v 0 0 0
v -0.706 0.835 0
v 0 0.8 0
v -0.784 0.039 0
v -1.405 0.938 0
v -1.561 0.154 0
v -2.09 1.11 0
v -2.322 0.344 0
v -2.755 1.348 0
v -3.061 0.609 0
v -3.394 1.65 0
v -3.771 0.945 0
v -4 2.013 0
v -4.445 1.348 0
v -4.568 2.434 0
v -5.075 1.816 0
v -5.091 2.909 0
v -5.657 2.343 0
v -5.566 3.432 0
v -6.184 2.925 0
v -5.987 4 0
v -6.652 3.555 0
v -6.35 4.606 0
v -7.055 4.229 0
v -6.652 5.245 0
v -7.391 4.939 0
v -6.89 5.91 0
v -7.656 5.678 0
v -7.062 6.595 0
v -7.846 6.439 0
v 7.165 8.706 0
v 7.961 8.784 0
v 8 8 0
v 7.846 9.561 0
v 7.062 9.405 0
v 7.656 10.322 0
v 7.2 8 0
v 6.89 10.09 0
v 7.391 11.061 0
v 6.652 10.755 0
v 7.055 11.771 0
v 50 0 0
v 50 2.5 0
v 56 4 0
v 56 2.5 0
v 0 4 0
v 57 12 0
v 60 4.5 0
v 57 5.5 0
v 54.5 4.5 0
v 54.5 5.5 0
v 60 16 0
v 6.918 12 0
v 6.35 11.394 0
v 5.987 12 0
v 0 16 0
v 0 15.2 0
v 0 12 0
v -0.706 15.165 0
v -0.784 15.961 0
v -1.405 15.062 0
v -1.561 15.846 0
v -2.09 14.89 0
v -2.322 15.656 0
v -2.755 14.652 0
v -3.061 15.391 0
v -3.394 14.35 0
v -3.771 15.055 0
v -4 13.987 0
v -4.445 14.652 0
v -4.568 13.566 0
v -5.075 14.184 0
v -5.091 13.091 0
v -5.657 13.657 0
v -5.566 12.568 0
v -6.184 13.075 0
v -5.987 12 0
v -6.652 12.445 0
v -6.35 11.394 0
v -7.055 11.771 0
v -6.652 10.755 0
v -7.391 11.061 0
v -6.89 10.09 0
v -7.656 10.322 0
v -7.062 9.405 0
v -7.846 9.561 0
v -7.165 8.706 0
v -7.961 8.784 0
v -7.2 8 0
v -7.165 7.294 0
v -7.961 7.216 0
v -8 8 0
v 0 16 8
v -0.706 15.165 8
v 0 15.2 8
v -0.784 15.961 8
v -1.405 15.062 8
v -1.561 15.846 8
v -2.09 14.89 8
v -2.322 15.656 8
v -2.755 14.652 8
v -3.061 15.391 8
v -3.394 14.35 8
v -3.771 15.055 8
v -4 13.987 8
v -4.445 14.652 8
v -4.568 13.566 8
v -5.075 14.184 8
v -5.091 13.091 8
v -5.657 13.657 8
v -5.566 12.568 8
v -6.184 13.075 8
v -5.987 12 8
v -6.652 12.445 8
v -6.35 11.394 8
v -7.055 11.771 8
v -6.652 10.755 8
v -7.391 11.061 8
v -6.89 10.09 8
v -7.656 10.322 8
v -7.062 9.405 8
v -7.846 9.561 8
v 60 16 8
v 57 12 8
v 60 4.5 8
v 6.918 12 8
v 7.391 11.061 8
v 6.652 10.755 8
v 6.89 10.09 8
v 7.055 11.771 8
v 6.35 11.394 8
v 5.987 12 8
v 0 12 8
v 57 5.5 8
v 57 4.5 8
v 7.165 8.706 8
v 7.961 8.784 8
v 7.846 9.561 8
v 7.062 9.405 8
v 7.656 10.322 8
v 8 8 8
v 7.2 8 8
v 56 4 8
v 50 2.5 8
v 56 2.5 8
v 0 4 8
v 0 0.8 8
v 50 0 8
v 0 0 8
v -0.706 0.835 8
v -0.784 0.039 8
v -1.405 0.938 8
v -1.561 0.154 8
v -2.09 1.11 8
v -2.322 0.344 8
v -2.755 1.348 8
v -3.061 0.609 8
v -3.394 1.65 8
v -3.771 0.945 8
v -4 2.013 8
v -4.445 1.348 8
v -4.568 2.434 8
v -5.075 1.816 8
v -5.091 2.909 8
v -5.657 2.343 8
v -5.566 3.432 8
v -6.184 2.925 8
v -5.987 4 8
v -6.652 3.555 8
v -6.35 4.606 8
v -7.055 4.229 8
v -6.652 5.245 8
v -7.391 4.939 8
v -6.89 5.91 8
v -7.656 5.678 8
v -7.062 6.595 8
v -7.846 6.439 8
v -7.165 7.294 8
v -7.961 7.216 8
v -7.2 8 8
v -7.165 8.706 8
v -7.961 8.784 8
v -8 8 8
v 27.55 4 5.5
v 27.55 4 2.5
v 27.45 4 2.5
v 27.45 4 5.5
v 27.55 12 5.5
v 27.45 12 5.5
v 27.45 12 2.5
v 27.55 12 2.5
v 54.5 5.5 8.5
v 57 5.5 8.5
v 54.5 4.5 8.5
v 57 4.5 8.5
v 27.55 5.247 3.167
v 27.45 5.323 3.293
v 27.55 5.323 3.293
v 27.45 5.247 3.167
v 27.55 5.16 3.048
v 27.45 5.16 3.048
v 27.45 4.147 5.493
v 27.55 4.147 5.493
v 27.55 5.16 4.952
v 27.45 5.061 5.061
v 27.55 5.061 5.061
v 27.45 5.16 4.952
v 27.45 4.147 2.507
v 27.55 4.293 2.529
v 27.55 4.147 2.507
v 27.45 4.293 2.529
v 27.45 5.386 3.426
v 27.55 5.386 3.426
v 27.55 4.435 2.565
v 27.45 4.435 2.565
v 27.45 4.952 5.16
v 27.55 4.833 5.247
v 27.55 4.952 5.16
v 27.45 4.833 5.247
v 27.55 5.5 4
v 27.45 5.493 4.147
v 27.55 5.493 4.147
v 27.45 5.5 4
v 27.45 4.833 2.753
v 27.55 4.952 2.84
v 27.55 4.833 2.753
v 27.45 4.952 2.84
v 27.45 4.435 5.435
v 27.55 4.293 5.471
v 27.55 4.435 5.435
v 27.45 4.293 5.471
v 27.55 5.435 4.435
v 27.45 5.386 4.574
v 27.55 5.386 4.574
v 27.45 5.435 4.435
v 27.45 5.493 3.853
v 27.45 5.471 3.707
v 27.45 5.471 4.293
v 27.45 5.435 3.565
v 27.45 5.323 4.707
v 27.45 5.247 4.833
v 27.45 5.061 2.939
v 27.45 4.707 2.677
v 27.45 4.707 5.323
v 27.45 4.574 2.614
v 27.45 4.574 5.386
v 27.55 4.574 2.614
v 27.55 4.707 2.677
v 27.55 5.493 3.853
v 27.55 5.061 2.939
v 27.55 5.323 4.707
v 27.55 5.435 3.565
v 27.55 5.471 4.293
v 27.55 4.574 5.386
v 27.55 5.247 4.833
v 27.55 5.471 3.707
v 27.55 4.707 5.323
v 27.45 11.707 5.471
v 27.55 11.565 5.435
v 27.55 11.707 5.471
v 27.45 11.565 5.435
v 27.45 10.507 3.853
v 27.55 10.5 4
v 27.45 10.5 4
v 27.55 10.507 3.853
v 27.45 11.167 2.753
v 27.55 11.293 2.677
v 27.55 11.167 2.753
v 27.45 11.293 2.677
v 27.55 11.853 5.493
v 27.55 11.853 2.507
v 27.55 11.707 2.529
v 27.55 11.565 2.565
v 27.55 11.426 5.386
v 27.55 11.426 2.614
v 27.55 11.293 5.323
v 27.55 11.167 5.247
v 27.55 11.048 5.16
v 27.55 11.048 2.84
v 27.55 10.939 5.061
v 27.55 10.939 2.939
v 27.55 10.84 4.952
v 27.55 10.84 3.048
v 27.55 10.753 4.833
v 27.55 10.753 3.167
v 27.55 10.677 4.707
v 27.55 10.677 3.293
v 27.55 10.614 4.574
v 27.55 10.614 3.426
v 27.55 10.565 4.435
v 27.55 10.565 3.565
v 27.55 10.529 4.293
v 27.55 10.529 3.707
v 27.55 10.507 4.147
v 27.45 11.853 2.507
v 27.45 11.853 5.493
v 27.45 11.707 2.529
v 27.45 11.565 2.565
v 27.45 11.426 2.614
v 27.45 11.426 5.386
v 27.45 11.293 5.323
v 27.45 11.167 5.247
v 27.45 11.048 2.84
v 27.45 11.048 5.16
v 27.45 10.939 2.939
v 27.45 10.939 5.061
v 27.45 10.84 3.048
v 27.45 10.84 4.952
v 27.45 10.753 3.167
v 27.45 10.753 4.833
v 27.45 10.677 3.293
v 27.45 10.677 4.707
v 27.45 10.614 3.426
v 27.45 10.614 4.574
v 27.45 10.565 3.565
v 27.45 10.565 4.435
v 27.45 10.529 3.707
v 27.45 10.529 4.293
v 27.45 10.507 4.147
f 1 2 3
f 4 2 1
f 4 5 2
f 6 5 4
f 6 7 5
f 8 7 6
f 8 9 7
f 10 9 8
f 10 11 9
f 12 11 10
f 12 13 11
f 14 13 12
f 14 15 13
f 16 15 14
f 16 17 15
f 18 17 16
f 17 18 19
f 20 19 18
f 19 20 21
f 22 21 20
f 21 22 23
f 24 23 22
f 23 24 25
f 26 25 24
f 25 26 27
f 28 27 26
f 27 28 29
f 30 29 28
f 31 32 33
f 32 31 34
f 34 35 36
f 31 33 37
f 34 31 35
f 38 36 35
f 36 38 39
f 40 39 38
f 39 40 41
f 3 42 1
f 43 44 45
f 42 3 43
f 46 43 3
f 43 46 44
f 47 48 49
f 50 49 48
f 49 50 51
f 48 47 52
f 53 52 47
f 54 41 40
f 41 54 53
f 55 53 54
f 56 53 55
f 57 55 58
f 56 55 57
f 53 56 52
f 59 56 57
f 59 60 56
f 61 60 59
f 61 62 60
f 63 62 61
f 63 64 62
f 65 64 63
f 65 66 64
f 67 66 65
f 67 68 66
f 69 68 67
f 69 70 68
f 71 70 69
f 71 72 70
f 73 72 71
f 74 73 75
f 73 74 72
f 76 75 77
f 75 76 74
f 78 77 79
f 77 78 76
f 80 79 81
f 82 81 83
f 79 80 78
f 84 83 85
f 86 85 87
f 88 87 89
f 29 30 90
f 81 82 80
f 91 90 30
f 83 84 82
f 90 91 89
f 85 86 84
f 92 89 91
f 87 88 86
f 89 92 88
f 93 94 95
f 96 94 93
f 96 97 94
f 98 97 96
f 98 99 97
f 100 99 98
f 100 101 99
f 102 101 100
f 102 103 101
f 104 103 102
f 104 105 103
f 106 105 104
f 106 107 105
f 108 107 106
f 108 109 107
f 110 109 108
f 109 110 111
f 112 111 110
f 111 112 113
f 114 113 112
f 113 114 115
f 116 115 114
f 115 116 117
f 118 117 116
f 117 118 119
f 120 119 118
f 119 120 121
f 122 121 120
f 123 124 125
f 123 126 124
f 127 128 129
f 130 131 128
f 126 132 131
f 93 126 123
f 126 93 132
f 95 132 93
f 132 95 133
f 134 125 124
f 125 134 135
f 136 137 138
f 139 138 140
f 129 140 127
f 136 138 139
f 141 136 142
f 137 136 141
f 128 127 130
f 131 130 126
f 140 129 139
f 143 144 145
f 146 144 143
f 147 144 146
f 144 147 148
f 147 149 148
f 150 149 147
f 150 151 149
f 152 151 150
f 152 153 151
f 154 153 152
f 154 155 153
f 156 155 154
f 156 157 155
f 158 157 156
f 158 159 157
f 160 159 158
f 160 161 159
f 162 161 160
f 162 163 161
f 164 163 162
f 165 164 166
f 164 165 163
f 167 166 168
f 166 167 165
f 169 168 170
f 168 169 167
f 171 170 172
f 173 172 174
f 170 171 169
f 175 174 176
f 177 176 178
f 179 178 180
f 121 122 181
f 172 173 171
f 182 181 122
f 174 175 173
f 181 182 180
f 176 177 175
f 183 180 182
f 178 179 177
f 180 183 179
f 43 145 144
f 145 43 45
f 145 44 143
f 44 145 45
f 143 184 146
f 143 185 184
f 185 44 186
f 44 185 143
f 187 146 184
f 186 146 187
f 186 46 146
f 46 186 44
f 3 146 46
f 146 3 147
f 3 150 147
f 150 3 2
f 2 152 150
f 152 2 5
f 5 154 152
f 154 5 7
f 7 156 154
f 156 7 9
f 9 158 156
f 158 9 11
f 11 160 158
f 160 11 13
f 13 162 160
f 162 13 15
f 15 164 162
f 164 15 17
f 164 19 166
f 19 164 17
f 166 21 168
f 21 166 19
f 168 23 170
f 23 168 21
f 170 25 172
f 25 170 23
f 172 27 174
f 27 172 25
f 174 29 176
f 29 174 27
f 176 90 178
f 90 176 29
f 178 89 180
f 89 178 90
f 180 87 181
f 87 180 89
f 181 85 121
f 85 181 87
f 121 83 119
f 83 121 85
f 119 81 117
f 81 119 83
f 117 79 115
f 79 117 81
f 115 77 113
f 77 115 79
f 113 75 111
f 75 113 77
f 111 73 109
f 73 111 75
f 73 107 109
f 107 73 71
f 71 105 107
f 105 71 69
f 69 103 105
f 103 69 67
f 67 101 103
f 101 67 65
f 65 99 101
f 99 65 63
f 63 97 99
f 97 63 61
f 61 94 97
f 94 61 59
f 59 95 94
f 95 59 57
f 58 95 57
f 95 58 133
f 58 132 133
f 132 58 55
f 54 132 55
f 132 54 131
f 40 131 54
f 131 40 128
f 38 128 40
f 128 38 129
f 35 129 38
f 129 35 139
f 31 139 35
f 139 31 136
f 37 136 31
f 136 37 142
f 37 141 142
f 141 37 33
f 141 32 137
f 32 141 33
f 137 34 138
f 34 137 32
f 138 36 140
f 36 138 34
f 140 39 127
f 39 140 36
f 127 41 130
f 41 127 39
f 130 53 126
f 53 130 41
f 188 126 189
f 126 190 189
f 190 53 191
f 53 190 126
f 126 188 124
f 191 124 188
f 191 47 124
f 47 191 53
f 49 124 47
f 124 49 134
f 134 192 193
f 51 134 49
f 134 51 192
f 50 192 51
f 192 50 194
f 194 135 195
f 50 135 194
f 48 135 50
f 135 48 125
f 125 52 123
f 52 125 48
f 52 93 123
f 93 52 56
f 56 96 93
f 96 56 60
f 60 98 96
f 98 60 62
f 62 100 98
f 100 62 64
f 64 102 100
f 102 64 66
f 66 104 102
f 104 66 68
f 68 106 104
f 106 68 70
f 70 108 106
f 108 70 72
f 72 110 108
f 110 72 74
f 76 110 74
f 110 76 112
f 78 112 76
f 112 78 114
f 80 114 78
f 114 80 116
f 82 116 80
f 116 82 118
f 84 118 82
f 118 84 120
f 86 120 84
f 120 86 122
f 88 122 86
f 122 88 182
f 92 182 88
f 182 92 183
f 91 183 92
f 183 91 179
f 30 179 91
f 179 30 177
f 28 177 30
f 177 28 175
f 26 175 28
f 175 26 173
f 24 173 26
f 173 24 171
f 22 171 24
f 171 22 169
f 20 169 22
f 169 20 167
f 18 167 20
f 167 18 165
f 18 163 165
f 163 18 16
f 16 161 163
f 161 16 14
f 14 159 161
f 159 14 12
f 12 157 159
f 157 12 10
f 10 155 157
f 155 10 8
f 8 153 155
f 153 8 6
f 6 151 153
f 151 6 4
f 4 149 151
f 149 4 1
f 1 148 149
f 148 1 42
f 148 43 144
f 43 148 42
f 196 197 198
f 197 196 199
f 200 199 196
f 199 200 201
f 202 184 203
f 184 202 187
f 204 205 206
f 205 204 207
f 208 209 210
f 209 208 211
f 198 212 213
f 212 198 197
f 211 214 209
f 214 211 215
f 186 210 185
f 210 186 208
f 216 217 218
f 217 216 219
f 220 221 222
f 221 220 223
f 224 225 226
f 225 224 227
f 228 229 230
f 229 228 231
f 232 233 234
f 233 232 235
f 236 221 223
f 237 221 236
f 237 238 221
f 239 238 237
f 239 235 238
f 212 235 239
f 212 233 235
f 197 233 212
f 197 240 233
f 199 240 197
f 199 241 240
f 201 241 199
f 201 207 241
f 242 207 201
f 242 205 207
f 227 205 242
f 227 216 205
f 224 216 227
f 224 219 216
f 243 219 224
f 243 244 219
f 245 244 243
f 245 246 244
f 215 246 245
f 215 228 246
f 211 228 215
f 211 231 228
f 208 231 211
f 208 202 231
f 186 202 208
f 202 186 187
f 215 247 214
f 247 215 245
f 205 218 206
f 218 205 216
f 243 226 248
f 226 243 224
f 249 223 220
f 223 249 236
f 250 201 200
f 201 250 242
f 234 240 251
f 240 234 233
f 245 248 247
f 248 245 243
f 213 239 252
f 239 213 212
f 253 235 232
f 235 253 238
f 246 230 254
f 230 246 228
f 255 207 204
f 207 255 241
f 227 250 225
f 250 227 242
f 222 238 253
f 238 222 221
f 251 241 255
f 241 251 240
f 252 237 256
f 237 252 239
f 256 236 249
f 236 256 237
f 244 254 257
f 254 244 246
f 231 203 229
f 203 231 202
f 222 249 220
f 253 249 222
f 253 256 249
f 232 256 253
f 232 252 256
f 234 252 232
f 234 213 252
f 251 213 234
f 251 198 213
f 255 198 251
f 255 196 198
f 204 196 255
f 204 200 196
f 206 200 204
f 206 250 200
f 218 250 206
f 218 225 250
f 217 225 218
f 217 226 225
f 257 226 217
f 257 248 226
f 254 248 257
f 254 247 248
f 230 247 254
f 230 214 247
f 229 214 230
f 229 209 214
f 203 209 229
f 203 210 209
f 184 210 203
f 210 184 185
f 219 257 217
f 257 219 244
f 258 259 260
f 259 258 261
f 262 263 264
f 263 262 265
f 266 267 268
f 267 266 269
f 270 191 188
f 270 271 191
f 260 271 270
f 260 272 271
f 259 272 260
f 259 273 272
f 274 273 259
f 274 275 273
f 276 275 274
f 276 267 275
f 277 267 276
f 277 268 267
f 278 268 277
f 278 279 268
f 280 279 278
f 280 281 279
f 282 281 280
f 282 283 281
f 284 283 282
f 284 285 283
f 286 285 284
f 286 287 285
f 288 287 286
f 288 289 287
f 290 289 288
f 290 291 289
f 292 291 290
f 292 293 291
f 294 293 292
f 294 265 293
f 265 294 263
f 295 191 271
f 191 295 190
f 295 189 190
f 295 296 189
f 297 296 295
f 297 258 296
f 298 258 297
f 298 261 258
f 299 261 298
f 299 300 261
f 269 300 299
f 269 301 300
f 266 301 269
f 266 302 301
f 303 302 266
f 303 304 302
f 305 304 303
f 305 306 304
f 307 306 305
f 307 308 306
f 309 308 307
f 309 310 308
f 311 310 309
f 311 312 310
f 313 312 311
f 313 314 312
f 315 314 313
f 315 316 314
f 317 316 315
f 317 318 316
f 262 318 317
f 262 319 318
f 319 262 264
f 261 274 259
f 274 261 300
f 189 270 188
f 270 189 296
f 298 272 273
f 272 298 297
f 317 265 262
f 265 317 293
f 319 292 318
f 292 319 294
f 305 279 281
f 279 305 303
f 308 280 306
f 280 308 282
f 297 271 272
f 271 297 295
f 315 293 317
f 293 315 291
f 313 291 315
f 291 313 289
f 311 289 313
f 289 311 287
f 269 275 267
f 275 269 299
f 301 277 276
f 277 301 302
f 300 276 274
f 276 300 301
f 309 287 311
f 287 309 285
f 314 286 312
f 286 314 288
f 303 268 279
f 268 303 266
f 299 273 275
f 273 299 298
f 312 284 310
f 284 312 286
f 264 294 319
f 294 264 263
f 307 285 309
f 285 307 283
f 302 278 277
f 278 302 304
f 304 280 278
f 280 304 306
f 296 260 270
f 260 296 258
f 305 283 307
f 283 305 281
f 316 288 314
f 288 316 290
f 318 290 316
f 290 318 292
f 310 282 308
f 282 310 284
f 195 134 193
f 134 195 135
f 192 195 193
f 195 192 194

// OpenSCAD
// Pinch clamp for silicone tubing (up to 6.4 mm)
// Corrected to ensure ridges and latch nose are additive features.

// --- Dimensions ---
thickness    = 8.0;    // Extrusion height (Z)
lower_len    = 50.0;   // Length of lower jaw bar
lower_y_w    = 4.0;    // Width of lower jaw bar
lower_tongue_len = 6.0; // Length of lower tongue (50 to 56)
lower_tongue_y_start = 2.5;
lower_tongue_y_end   = 4.0;

upper_len    = 60.0;   // Length of upper jaw bar
upper_y_start = 12.0;
upper_y_end   = 16.0;

hinge_center_y = 8.0;
hinge_r_in     = 7.2;
hinge_r_out    = 8.0;

ridge_radius   = 1.5;
ridge_x_pos    = 27.5;
ridge_y_low    = 4.0;
ridge_y_high   = 12.0;

latch_leg_x_start = 57.0;
latch_leg_x_end   = 60.0;
latch_leg_y_start = 4.5;
latch_leg_y_end   = 12.0;

latch_nose_x_start = 54.5;
latch_nose_x_end   = 57.0;
latch_nose_y_start = 4.5;
latch_nose_y_end   = 5.5;
latch_nose_z_offset = 0.5; // 0.5mm above the tongue (which is at Z=0)

$fn = 64;

module profile_2d() {
    // Lower Jaw Bar
    square([lower_len, lower_y_w]);
    
    // Lower Tongue
    translate([lower_len, lower_tongue_y_start])
        square([lower_tongue_len, lower_tongue_y_end - lower_tongue_y_start]);
    
    // Upper Jaw Bar
    translate([0, upper_y_start])
        square([upper_len, upper_y_end - upper_y_start]);
    
    // Hinge (Half-ring on the left side)
    difference() {
        translate([0, hinge_center_y])
            circle(r = hinge_r_out);
        translate([0, hinge_center_y])
            circle(r = hinge_r_in);
        // Cut the right half to make it a "half-ring" on the left side
        translate([0, -hinge_r_out])
            square([hinge_r_out, hinge_r_out * 2]);
    }
    
    // Latch Leg
    translate([latch_leg_x_start, latch_leg_y_start])
        square([latch_leg_x_end - latch_leg_x_start, latch_leg_y_end - latch_leg_y_start]);
    
    // Latch Nose (2D profile part)
    translate([latch_nose_x_start, latch_nose_y_start])
        square([latch_nose_x_end - latch_nose_x_start, latch_nose_y_end - latch_nose_y_start]);
}

// --- 3D Model Construction ---
union() {
    // Main Body (Extruded 2D profile)
    linear_extrude(height = thickness) {
        profile_2d();
    }

    // Additive Pinch Ridges (Half-round)
    // Lower ridge: centered at ridge_x_pos, ridge_y_low
    // Since it's a "half-round on the inner face", we place the cylinder 
    // such that the center is on the edge of the jaw.
    translate([ridge_x_pos, ridge_y_low, thickness/2])
        rotate([0, 90, 0])
            cylinder(h = 0.1, r = ridge_radius, center = true);
            
    // Upper ridge: centered at ridge_x_pos, ridge_y_high
    translate([ridge_x_pos, ridge_y_high, thickness/2])
        rotate([0, 90, 0])
            cylinder(h = 0.1, r = ridge_radius, center = true);

    // Additive Latch Nose (positioned 0.5mm above the tongue)
    // The tongue is at Z=0 to Z=thickness. 
    // The nose is a feature at Z = 0.5.
    // To make it a 3D feature, we extrude the nose profile at the correct Z.
    translate([0, 0, 0.5]) // Offset from base
    difference() {
        // We use a small extrusion to represent the nose thickness
        // But the prompt implies the nose is part of the geometry.
        // We'll extrude the nose profile from Z=0.5 to Z=0.5 + (thickness-0.5)
        // but we must ensure it's only the nose part.
        // A better way: extrude the nose profile and then subtract the rest.
        // However, the simplest way to follow "nose is 0.5mm above tongue" 
        // is to treat the nose as a 3D block.
        
        // We'll create the nose as a 3D block:
        translate([latch_nose_x_start, latch_nose_y_start, 0])
            cube([latch_nose_x_end - latch_nose_x_start, 
                  latch_nose_y_end - latch_nose_y_start, 
                  thickness]);
    }
    // Wait, the logic above for the nose is messy. Let's simplify:
    // The nose is a 3D part. Let's define it clearly.
}

// RE-REVISED 3D CONSTRUCTION (Clean)
// We will build the body, then add the ridges, then add the nose.

// 1. The main body
// 2. The ridges (half-cylinders)
// 3. The nose (a small block)

// Let's use a clean union approach.
// Note: The nose is 0.5mm above the tongue. The tongue is at Z=0.
// So the nose starts at Z=0.5
